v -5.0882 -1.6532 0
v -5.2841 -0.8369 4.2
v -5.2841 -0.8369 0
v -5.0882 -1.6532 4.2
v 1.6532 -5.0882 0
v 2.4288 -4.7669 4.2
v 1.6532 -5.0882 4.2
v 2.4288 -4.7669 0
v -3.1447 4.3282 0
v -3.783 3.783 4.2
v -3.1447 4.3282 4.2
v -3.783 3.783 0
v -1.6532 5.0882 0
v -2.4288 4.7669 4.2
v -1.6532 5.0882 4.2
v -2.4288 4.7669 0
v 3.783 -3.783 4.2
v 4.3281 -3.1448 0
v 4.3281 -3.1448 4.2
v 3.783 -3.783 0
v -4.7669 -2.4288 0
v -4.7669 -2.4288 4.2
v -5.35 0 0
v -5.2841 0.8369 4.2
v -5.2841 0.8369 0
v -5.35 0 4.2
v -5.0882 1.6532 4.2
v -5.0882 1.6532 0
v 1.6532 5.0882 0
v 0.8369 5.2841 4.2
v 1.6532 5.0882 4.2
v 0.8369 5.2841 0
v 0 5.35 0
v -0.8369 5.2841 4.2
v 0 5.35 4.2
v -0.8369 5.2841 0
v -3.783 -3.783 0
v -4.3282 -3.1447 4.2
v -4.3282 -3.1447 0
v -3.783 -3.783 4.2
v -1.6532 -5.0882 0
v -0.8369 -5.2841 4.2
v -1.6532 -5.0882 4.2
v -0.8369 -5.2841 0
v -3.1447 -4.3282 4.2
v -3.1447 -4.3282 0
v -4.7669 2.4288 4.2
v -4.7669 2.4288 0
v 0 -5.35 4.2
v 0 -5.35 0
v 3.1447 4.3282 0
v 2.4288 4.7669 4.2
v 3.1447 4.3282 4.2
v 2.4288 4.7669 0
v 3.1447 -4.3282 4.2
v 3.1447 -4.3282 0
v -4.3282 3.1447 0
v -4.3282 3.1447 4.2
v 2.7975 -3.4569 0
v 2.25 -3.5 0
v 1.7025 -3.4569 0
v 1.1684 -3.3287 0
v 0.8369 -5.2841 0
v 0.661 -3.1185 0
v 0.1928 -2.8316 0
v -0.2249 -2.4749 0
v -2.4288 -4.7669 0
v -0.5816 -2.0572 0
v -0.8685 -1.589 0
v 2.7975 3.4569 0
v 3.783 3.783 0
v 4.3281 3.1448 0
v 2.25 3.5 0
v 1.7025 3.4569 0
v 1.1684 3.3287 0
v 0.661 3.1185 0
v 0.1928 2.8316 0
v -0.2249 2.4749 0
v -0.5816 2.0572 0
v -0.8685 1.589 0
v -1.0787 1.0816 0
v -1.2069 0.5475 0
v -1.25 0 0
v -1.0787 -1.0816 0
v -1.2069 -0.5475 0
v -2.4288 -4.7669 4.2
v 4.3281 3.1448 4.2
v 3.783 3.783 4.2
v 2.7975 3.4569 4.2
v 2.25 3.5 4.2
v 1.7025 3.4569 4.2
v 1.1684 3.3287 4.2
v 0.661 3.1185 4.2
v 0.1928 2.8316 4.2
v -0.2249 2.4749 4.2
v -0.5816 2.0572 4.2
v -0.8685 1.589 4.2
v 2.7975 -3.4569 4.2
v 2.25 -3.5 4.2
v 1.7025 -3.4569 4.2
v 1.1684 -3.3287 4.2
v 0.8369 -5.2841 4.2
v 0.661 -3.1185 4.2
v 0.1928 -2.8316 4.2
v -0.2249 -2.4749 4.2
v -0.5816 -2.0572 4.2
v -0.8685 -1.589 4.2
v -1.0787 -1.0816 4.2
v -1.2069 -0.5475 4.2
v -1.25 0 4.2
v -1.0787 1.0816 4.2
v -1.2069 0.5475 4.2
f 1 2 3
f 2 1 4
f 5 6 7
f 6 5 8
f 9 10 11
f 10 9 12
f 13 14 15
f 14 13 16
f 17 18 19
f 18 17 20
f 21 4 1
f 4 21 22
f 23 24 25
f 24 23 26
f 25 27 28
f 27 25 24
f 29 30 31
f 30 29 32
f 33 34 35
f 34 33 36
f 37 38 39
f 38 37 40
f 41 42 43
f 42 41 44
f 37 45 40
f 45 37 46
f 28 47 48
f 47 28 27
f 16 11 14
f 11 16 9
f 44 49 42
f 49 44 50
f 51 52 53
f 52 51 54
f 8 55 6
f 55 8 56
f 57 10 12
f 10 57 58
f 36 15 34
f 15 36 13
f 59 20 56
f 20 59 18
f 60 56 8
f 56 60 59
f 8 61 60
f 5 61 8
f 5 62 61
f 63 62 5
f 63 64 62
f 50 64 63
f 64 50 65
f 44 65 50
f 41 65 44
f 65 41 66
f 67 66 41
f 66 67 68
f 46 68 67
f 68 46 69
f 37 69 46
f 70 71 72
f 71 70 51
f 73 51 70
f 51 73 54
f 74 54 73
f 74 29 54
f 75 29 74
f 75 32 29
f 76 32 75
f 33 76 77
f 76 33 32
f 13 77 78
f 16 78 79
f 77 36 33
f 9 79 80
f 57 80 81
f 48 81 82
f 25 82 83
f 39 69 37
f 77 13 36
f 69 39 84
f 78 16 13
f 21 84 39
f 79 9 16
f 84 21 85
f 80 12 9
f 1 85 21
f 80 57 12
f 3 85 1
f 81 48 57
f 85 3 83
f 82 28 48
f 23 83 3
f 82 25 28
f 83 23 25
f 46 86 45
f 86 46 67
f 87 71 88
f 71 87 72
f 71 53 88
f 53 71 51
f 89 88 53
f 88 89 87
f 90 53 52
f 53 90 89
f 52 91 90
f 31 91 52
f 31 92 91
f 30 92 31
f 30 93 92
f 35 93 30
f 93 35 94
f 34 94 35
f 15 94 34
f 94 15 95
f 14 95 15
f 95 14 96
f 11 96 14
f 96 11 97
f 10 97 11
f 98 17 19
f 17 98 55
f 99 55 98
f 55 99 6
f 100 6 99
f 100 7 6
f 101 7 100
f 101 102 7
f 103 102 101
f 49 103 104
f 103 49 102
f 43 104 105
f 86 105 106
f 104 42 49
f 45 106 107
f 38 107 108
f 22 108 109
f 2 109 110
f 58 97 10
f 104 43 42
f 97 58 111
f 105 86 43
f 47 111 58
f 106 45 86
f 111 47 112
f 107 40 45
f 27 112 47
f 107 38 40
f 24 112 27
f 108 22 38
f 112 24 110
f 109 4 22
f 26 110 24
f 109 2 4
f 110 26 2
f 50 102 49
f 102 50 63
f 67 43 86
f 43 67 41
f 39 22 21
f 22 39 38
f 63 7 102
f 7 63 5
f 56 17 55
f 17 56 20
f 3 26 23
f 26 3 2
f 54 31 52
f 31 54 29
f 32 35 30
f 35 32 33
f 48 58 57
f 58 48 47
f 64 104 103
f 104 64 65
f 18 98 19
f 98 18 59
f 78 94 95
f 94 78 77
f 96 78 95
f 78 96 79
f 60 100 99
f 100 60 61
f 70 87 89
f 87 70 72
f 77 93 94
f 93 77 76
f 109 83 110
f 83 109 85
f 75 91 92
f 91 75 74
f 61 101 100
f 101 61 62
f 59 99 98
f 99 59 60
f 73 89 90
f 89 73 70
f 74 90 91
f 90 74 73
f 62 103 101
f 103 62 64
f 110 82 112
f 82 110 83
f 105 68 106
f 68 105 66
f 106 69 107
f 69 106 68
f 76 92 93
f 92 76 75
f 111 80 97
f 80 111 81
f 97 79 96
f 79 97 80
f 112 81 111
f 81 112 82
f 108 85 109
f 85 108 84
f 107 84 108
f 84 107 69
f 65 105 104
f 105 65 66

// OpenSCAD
// diameter of the original (bigger) battery
dBig=11.5;

// height of the original (bigger) battery
hBig=5.2;

// diameter of the smaller battery that you have (hole in the big one)
dSmall=7.8;

// height of the smaller battery
hSmall=5.2;

// Tolerance on height, tune according to your result
hTol=1;

// Some tolerance on the diameters (else the fit may be a bit tight)
dTol=0.8;

// The small battery protrude a bit of the big diameter
holeShift= 0.4;

// Button/Cell battery adapter
// jeremie.francois@gmail.com / http://www.thingiverse.com/MoonCactus
// http://betterprinter.blogspot.fr/
// Licence: CC-BY-NC
//
// Print temp 212 (intead of ~234 usually!), cooling enabled
// 0.2 layer thickness, 0 top and bottom layer fill
// 0.8 wall tickness
// 0% fill
// 10s minimal time between layers
// 0.4 nozzle size
//


// No need to tweak this:
$fn=0+40;
tol=0+0.1;
dBigR= dBig - dTol;
dSmallR= dSmall - dTol;
hBigR= hBig - hTol;

difference()
{
  cylinder(r=dBigR/2, h=hBigR);
  translate([(dBigR-dSmallR)/2+holeShift,0,hBigR-hSmall-tol])
  hull()
  {
    cylinder(r=dSmallR/2, h=hSmall+2*tol);
    translate([10,0,0]) cylinder(r=dSmallR/2-2, h=hSmall+2*tol);
  }
}
